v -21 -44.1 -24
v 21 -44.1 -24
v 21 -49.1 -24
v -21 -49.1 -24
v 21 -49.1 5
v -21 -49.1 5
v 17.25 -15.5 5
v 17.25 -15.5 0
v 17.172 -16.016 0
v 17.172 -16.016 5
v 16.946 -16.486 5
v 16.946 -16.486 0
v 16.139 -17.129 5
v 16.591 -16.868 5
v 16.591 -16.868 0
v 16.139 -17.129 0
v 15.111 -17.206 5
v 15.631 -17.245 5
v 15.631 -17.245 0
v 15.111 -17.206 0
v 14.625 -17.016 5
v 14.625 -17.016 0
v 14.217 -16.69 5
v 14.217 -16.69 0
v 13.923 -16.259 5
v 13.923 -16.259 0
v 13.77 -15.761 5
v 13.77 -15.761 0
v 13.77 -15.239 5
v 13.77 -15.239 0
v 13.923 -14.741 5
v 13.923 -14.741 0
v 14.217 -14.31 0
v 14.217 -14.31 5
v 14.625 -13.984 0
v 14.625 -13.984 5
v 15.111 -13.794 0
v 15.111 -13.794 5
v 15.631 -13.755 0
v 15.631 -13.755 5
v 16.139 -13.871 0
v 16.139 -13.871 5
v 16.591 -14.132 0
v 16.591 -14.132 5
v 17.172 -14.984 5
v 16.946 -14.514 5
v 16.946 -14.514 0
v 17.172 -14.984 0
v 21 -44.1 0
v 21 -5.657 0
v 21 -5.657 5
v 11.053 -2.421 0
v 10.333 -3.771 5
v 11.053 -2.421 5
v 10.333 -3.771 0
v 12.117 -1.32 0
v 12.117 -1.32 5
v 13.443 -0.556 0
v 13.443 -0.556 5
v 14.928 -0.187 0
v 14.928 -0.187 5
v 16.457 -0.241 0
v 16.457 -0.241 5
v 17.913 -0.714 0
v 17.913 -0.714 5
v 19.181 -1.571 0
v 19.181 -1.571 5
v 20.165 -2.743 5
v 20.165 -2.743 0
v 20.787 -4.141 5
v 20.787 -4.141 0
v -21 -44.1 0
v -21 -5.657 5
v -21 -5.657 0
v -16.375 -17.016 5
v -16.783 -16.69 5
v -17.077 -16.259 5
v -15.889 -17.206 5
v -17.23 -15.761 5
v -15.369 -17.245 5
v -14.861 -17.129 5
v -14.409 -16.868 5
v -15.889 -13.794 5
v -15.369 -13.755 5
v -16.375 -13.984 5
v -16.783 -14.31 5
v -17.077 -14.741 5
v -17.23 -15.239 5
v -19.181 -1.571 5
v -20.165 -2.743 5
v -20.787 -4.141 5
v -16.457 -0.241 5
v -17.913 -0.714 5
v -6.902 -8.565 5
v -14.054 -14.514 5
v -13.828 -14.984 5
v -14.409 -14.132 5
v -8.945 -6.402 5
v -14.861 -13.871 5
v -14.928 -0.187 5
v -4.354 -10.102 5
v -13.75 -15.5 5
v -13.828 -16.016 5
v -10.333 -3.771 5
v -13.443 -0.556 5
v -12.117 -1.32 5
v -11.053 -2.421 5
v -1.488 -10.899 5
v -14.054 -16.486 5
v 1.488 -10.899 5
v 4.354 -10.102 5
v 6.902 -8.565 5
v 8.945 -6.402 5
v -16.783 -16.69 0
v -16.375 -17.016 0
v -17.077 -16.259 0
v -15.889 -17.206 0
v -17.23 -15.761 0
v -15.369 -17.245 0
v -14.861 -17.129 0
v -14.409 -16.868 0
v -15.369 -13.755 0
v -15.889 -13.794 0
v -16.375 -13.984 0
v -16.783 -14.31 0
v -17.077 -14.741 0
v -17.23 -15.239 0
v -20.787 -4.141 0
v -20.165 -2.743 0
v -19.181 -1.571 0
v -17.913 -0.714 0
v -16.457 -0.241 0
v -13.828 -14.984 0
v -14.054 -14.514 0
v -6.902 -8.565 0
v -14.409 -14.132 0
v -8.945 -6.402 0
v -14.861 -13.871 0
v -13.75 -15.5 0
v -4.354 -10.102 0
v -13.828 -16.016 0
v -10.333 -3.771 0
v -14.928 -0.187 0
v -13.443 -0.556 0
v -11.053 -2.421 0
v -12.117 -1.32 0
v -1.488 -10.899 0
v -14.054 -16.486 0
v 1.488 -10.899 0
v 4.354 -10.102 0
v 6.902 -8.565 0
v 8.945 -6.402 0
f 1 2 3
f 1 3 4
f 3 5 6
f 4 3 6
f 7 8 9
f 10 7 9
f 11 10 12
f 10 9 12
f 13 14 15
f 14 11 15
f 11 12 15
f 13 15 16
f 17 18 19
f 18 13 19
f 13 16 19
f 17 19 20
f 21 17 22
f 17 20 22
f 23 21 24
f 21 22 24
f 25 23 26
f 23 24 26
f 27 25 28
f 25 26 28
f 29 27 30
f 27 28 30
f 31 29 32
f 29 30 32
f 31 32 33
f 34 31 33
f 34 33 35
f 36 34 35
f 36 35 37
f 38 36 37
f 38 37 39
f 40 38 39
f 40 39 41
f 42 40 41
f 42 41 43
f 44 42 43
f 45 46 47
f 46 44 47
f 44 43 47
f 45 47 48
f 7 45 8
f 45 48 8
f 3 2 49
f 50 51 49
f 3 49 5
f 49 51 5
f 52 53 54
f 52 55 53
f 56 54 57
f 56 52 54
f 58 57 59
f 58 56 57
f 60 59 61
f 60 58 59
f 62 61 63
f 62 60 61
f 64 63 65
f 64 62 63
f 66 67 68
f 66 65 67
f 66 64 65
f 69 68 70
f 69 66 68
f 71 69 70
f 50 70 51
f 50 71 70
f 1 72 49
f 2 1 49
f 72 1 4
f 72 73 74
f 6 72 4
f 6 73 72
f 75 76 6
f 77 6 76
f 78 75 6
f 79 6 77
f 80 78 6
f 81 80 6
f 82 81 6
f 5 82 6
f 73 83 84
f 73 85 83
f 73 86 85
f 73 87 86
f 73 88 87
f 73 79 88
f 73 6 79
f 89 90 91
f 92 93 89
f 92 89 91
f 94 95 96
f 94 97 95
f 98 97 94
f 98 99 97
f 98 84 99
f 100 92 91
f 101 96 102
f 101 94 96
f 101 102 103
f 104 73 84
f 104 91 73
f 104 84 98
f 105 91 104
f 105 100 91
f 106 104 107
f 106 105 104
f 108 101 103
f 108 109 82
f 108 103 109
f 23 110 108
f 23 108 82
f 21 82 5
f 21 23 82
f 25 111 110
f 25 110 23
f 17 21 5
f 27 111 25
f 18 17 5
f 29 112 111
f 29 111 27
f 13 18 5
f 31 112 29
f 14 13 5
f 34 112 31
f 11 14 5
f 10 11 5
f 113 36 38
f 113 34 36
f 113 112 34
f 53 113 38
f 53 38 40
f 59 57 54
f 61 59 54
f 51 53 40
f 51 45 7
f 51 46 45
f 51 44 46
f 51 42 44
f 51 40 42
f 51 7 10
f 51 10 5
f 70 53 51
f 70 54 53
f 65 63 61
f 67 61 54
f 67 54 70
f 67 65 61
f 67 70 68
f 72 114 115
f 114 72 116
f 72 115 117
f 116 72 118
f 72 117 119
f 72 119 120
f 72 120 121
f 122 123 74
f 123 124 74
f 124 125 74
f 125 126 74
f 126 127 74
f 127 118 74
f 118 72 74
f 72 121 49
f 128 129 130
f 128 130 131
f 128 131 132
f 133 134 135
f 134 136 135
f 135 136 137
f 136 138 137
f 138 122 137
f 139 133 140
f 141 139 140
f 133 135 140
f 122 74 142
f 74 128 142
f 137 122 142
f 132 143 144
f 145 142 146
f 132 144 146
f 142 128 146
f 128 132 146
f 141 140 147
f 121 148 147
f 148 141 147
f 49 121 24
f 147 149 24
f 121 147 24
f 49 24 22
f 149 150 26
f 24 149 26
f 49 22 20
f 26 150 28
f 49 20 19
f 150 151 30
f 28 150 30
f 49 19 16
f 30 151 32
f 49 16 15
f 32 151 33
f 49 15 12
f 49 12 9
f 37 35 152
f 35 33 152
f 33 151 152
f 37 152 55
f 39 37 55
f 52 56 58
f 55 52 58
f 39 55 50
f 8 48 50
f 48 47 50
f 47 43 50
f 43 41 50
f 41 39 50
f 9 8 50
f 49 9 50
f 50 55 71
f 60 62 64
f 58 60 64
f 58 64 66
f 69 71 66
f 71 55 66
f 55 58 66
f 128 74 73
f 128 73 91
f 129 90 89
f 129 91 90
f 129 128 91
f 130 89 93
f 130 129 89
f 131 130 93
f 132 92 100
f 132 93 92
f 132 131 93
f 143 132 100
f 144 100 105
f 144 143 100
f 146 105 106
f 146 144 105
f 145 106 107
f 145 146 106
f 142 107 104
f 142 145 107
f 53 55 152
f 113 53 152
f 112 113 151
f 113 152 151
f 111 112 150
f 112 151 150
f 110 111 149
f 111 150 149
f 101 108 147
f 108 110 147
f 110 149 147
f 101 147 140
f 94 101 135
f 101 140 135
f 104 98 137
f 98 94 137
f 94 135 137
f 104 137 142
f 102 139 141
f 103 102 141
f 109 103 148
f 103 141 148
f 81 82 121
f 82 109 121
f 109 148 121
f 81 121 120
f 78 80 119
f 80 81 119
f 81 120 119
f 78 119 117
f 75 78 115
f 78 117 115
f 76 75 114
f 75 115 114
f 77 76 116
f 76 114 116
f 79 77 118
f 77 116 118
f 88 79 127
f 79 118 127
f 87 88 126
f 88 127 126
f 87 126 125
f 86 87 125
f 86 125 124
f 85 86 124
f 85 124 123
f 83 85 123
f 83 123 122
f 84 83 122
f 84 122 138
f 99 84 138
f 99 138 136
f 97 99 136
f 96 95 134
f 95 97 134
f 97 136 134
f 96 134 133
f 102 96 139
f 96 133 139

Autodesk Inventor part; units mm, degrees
ref_plane "YZ Plane" through (0, 0, 0) normal (1, 0, 0) x (0, 1, 0)
ref_plane "XZ Plane" through (0, 0, 0) normal (0, 1, 0) x (-1, 0, 0)
ref_plane "XY Plane" through (0, 0, 0) normal (0, 0, 1) x (1, 0, 0)
ref_plane "Work Plane1" through (0, 0, 0) normal (0, 0, 1) x (1, 0, 0)
sketch "Sketch1" plane through (0, 0, 0) normal (0, 0, 1) x (1, 0, 0)
  circle A0 centre (0, 0) radius 11 projected
  circle A1 centre (-15.5, -15.5) radius 1.75 projected
  circle A2 centre (15.5, -15.5) radius 1.75 projected
  circle A3 centre (15.5, 15.5) radius 1.75 projected
  circle A4 centre (-15.5, 15.5) radius 1.75 projected
  line L0 (-21, 21) -> (21, 21) projected
  line L1 (-21, -21) -> (-21, 21) projected
  line L2 (21, -21) -> (-21, -21) projected
  line L3 (21, 21) -> (21, -21) projected
  line L4 (40.7911, -42.1) -> (-34.1821, -42.1) projected
  line L5 (21, -44.1) -> (-21, -44.1)
  arc A5 (-10.3333, -3.7712) -> (-21, -5.6569) centre (-15.5, -5.6569) ccw
  arc A6 (-10.3333, -3.7712) -> (10.3333, -3.7712) centre (0, 0) ccw
  arc A7 (21, -5.6569) -> (10.3333, -3.7712) centre (15.5, -5.6569) ccw
  line L6 (-21, -5.6569) -> (-21, -44.1)
  line L7 (21, -5.6569) -> (21, -44.1)
  line L8 (-21, -21) -> (21, -21)
  line L9 (21, -21) -> (21, -49.1)
  line L10 (21, -49.1) -> (-21, -49.1)
  line L11 (-21, -49.1) -> (-21, -21)
  point P0 (0, 0)
  dimension "d0" = 2
  dimension "d1" = 5
extrude "Extrusion1" add sketch "Sketch1" along normal blind 5 contours A0 A7 L3 L2 L1 A5 | L2 L7 L4 L6 | L4 L7 L5 L6 | L5 L9 L10 L11
sketch "Sketch2" plane through (0, 0, 0) normal (0, 0, -1) x (-1, 0, 0)
  line L0 (-21, -49.1) -> (21, -49.1) projected
  line L1 (21, -5.6569) -> (21, -49.1) projected
  line L2 (-21, -49.1) -> (21, -49.1)
  line L3 (21, -49.1) -> (21, -44.1)
  line L4 (21, -44.1) -> (-21, -44.1)
  line L5 (-21, -44.1) -> (-21, -49.1)
  point P0 (0, 0)
  dimension "d4" = 5
extrude "Extrusion2" add sketch "Sketch2" along normal blind 24
properties part number "Shelf Braket"
